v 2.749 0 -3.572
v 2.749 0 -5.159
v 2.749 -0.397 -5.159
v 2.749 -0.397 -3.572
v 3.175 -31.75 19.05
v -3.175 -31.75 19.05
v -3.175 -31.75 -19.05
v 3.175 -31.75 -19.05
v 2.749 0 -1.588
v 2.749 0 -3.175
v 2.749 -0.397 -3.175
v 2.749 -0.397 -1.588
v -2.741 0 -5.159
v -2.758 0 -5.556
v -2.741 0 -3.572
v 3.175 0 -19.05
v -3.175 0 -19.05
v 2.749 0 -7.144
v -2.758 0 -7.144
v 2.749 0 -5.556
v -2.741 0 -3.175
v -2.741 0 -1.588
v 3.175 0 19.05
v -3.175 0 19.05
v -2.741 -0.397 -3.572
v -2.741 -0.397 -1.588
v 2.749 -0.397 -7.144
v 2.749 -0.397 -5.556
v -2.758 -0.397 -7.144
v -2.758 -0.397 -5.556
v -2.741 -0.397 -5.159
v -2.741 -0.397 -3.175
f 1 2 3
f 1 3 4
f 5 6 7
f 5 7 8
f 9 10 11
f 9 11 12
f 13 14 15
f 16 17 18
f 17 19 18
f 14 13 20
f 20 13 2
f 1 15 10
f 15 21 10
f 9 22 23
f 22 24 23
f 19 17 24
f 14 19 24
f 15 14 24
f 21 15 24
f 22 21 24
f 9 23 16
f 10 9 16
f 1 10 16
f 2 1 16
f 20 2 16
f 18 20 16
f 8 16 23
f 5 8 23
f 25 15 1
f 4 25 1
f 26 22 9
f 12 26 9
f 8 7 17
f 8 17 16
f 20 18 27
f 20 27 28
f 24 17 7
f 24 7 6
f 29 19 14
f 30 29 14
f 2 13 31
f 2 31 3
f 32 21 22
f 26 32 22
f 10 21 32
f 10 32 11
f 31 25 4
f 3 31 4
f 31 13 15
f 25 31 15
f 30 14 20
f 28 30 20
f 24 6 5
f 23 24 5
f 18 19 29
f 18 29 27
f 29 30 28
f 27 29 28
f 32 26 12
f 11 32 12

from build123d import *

# Parameters (mm, degrees)
F0_W     = 6.35
F0_H     = 38.1
F1_DEPTH = 31.75
F2_W     = 5.4897969239
F2_H     = 1.5875
F2_W_2   = 5.5069834925
F3_DEPTH = 0.396875


# Not quite as in the source:
# - a length typed as a fraction of an inch, garbled in the dataset ("3 / 203.2 mm" for 3/8 in), is restored


with BuildPart() as f1:
    # F0 (on Front) → F1 (new body)
    with BuildSketch(Plane.XZ):
        Rectangle(F0_W, F0_H)
    extrude(amount=F1_DEPTH)

    # F2 (on Front) → F3 (cut)
    with BuildSketch(Plane.XZ):
        with Locations((0.0038447615, -2.38125)):
            Rectangle(F2_W, F2_H)
        with Locations((0.0038447615, -4.365625)):
            Rectangle(F2_W, F2_H)
        with Locations((-0.0047485228, -6.35)):
            Rectangle(F2_W_2, F2_H)
    extrude(amount=F3_DEPTH, mode=Mode.SUBTRACT)


solid = f1.part
